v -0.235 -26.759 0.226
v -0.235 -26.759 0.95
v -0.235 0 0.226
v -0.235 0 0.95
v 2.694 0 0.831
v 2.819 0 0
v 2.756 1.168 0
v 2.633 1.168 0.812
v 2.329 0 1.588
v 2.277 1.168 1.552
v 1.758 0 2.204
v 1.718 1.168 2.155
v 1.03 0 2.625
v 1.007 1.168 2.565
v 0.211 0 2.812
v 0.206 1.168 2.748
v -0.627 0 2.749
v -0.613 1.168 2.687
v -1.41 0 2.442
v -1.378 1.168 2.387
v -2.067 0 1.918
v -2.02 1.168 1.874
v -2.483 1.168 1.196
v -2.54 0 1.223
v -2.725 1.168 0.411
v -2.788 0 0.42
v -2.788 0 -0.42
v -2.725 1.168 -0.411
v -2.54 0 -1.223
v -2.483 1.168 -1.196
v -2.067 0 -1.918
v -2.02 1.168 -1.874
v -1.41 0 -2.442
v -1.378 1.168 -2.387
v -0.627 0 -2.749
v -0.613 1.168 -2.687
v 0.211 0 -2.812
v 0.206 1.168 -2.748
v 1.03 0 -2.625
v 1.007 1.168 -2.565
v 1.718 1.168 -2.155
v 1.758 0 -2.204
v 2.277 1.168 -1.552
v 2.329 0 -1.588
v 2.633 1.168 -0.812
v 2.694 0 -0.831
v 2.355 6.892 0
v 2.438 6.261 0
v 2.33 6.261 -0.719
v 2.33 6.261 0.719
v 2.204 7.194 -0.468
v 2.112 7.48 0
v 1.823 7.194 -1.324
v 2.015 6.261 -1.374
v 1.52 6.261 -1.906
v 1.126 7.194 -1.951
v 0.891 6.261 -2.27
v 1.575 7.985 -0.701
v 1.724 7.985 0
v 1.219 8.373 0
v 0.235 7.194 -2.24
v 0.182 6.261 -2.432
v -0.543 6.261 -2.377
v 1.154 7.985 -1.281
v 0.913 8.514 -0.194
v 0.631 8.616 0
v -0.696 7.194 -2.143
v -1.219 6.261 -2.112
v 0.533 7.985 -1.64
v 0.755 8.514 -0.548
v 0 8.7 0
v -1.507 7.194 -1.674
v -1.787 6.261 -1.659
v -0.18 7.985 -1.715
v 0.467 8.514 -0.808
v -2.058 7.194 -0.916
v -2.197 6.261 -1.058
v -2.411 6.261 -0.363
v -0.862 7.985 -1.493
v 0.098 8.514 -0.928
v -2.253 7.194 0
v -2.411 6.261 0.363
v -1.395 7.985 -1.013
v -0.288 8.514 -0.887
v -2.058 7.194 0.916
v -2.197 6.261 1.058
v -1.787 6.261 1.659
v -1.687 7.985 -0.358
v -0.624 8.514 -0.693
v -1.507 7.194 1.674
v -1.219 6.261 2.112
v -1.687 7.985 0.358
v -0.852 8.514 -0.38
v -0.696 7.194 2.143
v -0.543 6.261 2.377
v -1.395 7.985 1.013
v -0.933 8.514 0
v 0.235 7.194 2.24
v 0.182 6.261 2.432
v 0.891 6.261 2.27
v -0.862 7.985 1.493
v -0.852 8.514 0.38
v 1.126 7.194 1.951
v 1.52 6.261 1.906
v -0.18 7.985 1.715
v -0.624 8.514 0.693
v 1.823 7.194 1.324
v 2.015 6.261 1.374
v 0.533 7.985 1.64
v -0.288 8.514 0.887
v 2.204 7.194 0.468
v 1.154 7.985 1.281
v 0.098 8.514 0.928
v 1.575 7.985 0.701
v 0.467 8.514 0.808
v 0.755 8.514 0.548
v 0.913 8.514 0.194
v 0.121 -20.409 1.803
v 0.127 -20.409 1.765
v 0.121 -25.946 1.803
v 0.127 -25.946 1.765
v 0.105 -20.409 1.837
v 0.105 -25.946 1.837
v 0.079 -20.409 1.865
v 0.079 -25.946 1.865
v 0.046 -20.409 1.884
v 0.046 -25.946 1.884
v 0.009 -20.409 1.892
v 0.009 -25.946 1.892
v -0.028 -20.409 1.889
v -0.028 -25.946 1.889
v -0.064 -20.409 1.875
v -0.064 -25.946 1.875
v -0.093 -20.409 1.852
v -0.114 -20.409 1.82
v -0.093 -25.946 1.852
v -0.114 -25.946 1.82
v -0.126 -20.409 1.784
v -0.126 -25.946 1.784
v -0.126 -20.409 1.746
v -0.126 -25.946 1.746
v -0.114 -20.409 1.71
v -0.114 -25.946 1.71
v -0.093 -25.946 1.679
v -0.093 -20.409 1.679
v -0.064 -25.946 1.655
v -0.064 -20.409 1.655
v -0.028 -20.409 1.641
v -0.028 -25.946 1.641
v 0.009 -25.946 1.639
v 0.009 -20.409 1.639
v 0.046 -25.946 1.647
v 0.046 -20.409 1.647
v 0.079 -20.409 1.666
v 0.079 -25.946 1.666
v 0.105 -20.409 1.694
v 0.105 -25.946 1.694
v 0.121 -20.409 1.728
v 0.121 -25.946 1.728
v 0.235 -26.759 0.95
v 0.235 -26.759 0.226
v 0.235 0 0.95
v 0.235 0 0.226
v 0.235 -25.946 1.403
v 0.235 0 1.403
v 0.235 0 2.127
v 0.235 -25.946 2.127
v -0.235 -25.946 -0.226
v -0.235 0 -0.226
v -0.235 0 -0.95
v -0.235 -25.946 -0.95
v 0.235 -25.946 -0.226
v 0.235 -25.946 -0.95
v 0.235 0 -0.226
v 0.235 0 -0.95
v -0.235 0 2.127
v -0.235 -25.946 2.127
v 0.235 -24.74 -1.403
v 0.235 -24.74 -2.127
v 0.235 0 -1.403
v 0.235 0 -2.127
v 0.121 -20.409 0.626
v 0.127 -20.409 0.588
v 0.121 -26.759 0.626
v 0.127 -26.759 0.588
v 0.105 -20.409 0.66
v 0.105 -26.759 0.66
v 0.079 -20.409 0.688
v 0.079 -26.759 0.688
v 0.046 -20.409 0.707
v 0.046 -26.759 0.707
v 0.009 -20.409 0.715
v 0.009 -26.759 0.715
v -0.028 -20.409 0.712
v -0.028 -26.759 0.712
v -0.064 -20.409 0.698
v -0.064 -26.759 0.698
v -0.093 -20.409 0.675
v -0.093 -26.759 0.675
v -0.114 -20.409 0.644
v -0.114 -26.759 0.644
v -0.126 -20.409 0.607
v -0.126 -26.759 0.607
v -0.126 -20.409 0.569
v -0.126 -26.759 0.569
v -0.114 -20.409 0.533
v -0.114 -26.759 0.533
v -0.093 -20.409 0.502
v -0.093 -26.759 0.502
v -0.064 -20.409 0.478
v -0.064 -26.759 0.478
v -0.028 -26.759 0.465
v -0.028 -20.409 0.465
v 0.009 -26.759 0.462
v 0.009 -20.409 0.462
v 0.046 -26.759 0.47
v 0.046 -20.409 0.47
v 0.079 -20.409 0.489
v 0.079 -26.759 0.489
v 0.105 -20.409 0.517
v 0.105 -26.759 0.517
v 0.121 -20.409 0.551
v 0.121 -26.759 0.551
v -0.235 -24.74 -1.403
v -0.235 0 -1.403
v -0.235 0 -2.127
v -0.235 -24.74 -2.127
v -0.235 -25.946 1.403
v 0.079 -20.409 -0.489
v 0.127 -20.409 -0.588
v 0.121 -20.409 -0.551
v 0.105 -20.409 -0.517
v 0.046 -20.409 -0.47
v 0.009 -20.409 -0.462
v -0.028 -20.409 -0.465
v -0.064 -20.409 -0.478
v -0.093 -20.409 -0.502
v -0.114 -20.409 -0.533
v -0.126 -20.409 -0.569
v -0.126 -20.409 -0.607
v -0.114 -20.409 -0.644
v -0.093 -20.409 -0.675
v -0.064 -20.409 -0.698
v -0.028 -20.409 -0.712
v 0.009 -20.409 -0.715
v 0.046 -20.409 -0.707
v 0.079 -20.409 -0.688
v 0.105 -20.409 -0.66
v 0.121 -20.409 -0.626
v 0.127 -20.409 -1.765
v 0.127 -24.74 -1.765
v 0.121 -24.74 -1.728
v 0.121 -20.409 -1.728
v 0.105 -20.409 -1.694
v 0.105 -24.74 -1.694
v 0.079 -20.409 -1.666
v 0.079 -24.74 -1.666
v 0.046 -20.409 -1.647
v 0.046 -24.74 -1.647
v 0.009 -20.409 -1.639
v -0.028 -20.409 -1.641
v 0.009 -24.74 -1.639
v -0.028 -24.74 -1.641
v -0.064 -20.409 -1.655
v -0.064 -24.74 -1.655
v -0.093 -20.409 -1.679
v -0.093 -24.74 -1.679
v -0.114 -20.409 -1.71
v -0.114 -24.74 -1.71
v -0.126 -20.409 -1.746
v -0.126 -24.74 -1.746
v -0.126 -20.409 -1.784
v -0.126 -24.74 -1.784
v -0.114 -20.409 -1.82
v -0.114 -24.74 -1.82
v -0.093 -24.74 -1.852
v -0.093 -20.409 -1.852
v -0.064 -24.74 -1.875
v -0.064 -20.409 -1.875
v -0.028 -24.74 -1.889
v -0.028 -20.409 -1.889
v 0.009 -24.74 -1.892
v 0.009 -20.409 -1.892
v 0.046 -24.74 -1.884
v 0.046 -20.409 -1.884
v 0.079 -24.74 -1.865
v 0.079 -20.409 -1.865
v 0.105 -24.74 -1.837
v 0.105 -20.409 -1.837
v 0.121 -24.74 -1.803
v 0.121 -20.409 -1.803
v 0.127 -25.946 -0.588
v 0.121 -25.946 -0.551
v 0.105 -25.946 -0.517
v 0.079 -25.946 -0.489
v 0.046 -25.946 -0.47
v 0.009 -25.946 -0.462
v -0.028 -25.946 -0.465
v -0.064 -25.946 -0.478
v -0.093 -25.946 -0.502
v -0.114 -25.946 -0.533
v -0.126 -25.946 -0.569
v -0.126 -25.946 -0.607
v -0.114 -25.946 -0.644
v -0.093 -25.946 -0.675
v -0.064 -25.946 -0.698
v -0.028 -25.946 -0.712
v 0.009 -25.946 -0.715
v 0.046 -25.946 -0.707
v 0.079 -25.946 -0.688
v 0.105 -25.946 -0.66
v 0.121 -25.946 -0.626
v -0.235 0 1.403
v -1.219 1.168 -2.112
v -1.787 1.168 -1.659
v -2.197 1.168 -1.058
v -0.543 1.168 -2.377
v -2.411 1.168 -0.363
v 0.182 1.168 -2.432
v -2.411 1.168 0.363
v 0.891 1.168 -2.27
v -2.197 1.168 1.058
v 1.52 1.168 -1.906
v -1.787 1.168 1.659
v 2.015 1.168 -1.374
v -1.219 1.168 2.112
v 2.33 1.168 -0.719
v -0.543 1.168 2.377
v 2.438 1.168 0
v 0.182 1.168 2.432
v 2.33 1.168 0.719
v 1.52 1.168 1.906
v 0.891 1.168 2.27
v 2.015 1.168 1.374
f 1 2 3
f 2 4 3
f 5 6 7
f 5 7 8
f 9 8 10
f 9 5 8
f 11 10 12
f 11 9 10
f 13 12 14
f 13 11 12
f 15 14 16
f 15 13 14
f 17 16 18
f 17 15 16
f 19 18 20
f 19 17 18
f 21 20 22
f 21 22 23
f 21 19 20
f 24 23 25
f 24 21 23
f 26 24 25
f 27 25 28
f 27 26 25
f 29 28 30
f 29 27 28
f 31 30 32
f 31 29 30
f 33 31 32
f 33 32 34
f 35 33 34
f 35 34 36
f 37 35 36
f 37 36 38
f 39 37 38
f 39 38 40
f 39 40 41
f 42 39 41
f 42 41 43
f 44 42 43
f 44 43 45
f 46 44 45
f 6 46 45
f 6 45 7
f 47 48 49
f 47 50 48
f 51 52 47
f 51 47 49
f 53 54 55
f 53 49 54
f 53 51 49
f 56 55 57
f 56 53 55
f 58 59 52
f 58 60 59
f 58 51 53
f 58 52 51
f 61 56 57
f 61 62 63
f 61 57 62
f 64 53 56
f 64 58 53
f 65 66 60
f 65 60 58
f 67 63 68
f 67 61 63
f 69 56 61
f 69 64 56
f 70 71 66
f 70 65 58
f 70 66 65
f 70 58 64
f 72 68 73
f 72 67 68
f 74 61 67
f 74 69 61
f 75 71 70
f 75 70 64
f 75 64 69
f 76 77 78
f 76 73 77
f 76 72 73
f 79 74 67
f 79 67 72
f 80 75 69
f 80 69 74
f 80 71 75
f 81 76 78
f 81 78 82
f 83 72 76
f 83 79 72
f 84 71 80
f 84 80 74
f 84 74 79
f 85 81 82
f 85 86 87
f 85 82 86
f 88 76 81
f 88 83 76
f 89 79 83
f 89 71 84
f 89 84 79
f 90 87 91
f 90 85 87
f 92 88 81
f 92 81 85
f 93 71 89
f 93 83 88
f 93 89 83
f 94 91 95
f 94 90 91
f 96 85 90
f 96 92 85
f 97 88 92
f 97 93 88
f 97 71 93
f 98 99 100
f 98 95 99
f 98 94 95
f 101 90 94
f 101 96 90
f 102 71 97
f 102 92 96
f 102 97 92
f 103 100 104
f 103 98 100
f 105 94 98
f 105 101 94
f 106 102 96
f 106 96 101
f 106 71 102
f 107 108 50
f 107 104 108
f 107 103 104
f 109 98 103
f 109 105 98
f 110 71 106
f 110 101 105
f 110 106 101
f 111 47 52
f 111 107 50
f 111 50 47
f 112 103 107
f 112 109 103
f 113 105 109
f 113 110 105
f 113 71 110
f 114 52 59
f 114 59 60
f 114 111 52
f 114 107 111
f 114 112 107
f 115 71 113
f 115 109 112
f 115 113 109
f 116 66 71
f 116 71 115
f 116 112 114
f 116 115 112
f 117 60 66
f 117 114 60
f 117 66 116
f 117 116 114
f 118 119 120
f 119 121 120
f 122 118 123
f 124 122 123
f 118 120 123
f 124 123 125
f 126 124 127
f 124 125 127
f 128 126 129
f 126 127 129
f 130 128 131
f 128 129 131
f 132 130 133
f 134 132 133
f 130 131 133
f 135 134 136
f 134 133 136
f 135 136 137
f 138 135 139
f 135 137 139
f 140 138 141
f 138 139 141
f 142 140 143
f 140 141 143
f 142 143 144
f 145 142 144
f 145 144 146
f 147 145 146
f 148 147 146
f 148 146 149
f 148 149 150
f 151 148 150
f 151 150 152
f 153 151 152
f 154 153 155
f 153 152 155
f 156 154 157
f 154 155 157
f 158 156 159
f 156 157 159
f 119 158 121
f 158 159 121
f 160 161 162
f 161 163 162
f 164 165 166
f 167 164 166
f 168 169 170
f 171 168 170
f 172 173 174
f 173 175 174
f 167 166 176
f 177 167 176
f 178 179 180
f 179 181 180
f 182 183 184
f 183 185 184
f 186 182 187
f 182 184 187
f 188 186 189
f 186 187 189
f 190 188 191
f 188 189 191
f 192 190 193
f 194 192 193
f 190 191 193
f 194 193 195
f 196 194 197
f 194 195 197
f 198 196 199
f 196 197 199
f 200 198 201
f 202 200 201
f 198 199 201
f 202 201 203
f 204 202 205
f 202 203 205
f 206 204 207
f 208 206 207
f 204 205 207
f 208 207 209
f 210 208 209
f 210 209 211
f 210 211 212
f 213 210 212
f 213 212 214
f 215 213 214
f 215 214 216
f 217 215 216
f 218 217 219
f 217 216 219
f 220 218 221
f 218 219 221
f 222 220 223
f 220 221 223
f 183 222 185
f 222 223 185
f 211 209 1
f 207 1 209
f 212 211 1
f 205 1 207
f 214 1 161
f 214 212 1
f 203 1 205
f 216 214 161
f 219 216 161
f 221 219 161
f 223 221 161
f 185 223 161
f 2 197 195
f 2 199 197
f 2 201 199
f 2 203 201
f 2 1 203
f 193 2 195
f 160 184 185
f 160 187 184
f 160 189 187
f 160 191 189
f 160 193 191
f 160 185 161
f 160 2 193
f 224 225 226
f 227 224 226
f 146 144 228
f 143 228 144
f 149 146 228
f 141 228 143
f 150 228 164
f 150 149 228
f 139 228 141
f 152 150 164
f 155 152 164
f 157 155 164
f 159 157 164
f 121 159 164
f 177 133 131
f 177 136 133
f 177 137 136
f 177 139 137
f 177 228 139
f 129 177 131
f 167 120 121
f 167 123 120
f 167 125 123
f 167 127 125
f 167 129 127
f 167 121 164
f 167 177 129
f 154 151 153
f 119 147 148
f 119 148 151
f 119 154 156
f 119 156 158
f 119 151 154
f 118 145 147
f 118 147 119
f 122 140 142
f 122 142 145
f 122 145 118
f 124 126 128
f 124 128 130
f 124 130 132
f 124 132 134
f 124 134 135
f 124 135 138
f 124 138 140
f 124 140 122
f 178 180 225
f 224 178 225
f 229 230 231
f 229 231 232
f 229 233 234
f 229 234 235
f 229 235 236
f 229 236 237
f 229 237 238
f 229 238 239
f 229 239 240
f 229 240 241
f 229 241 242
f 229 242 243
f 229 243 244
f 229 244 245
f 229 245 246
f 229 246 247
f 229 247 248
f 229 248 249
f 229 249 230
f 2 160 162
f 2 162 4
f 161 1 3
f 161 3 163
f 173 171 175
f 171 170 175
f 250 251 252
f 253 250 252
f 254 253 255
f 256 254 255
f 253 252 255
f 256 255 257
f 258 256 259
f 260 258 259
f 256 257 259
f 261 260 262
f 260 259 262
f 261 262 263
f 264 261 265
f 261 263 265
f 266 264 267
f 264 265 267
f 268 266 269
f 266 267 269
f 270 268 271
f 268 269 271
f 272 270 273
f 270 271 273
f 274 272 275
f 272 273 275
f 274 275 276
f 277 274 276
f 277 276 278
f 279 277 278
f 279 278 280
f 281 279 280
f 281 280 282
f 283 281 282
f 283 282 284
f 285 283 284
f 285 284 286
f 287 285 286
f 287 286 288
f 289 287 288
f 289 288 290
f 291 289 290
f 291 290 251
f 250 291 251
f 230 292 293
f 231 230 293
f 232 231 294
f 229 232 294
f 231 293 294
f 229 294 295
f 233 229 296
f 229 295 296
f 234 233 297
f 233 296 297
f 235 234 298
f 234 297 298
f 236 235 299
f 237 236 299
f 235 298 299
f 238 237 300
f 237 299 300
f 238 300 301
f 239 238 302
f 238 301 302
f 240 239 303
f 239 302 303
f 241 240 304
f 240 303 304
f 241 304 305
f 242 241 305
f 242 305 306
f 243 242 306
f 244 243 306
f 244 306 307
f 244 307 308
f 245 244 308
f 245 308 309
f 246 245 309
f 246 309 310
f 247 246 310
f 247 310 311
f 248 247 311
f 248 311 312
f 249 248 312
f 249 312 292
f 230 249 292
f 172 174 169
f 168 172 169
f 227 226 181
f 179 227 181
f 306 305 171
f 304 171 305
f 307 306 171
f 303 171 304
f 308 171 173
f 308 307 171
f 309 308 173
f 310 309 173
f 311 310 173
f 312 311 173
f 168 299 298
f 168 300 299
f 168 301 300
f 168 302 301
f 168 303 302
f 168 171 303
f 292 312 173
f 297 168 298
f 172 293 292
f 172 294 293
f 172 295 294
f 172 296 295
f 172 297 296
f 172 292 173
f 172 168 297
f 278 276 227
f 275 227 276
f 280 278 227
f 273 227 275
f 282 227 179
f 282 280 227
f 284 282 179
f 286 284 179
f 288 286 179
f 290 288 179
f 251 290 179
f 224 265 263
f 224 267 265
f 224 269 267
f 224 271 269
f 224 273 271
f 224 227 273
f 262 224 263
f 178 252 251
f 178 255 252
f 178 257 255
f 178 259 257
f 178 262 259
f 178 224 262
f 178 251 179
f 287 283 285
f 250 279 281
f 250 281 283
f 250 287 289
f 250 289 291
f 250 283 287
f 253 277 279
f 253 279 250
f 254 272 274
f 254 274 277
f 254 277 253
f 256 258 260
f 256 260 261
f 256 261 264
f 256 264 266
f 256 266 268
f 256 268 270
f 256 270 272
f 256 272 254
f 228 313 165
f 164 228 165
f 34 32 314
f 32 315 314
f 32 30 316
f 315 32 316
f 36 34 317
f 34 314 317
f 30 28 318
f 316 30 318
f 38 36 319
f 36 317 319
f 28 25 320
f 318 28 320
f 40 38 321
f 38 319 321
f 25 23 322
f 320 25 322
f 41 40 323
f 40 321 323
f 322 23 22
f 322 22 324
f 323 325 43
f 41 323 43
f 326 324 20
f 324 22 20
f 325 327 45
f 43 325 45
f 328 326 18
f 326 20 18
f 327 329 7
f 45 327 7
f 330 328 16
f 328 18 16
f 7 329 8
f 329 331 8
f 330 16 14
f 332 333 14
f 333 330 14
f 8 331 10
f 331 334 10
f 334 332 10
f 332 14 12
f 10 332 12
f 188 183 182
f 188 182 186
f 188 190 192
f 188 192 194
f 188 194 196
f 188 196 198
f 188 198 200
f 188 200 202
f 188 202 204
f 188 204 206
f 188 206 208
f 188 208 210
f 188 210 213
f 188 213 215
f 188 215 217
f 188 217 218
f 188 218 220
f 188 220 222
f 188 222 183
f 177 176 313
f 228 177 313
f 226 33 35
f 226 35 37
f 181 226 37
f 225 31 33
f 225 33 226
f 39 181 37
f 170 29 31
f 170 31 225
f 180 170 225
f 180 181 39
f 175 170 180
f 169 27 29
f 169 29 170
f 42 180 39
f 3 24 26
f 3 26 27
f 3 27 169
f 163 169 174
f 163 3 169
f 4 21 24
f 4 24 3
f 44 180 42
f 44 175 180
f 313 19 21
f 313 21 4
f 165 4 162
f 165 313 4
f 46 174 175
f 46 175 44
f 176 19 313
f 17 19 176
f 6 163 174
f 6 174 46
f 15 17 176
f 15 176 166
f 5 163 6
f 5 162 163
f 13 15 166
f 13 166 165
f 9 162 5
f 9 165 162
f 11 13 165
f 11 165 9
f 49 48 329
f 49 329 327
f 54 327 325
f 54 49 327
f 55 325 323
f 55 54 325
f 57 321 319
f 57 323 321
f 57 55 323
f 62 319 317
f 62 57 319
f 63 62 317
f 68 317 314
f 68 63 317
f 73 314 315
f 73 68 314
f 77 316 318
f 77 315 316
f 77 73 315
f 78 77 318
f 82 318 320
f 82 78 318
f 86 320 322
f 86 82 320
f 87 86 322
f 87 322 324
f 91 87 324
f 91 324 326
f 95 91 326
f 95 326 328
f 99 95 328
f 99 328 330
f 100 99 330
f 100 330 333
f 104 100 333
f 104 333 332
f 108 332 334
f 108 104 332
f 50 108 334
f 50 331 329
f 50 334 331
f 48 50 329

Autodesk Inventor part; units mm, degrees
ref_plane "YZ Plane" through (0, 0, 0) normal (1, 0, 0) x (0, 1, 0)
ref_plane "XZ Plane" through (0, 0, 0) normal (0, 1, 0) x (-1, 0, 0)
ref_plane "XY Plane" through (0, 0, 0) normal (0, 0, 1) x (1, 0, 0)
sketch "Sketch1" plane through (0, 0, 0) normal (0, 0, 1) x (1, 0, 0)
  line L0 (0, 8.6995) -> (0, 0)
  line L1 (0, 0) -> (2.8194, 0)
  line L2 (2.8194, 0) -> (2.7559, 1.1684)
  line L3 (2.7559, 1.1684) -> (2.4384, 1.1684)
  line L4 (2.4384, 1.1684) -> (2.4384, 6.2611)
  arc A0 (2.4384, 6.2611) -> (0, 8.6995) centre (0, 6.2611) ccw
  dimension "d0" = 2.4384
  dimension "d1" = 2.8194
  dimension "d2" = 2.7559
  dimension "d3" = 1.1684
  dimension "d4" = 8.6995
revolve "Revolution1" add sketch "Sketch1" angle 360 about axis through (0, 8.6995, 0) along (0, -1, 0)
sketch "Sketch2" plane through (0, 0, 0) normal (0, -1, 0) x (1, 0, 0)
  line L0 (0.235, 2.1273) -> (-0.2349, 2.1273)
  line L1 (-0.2349, 2.1273) -> (-0.2349, 1.4034)
  line L2 (-0.2349, 1.4034) -> (0.235, 1.4034)
  line L3 (0.235, 1.4034) -> (0.235, 2.1273)
  line L4 (0.235, 2.1273) -> (-0.2349, 1.4034) construction
  line L5 (-0.2349, 2.1273) -> (0.235, 1.4034) construction
  line L6 (0.235, 0.9504) -> (-0.2349, 0.9504)
  line L7 (-0.2349, 0.9504) -> (-0.2349, 0.2265)
  line L8 (-0.2349, 0.2265) -> (0.235, 0.2265)
  line L9 (0.235, 0.2265) -> (0.235, 0.9504)
  line L10 (0.235, 0.9504) -> (-0.2349, 0.2265) construction
  line L11 (-0.2349, 0.9504) -> (0.235, 0.2265) construction
  line L12 (0.235, -0.2265) -> (-0.2349, -0.2265)
  line L13 (-0.2349, -0.2265) -> (-0.2349, -0.9504)
  line L14 (-0.2349, -0.9504) -> (0.235, -0.9504)
  line L15 (0.235, -0.9504) -> (0.235, -0.2265)
  line L16 (0.235, -0.2265) -> (-0.2349, -0.9504) construction
  line L17 (-0.2349, -0.2265) -> (0.235, -0.9504) construction
  line L18 (0.2349, -1.4033) -> (-0.2349, -1.4033)
  line L19 (-0.2349, -1.4033) -> (-0.2349, -2.1273)
  line L20 (-0.2349, -2.1273) -> (0.2349, -2.1273)
  line L21 (0.2349, -2.1273) -> (0.2349, -1.4033)
  line L22 (0.2349, -1.4033) -> (-0.2349, -2.1273) construction
  line L23 (-0.2349, -1.4033) -> (0.2349, -2.1273) construction
  circle A0 centre (0, 0) radius 2.7559 construction
  line L24 (2.7559, 0) -> (-2.7559, 0) construction
  point P0 (0, 0)
  point P1 (0, 1.7653)
  point P2 (0, 0.5884)
  point P3 (0, -0.5884)
  point P4 (0, -1.7653)
  point P5 (0, -1.7653)
  point P6 (0, -0.9504)
  point P7 (0, -0.5884)
  point P8 (0, 0.5884)
  point P9 (0, 0.2265)
  point P10 (0, 1.7653)
  point P11 (0, -0.5884)
  dimension "d6" = 0.4699
  dimension "d7" = 0.7239
  dimension "d8" = 4.2545
  dimension "d9" = 0.453
  dimension "d10" = 0.453
extrude "Extrusion1" add sketch "Sketch2" along normal blind 24.7396
sketch "Sketch3" plane through (0, -24.7396, 0) normal (0, -1, 0) x (1, 0, 0)
  line L0 (0.235, 2.1273) -> (-0.2349, 2.1273) projected
  line L1 (-0.2349, 2.1273) -> (-0.2349, 1.4034) projected
  line L2 (-0.2349, 1.4034) -> (0.235, 1.4034) projected
  line L3 (0.235, 1.4034) -> (0.235, 2.1273) projected
  line L4 (0.235, -0.2265) -> (-0.2349, -0.2265) projected
  line L5 (-0.2349, -0.2265) -> (-0.2349, -0.9504) projected
  line L6 (-0.2349, -0.9504) -> (0.235, -0.9504) projected
  line L7 (0.235, -0.9504) -> (0.235, -0.2265) projected
  point P0 (0, 0)
extrude "Extrusion2" add sketch "Sketch3" along normal blind 1.2065
sketch "Sketch4" plane through (0, -24.7396, 0) normal (0, -1, 0) x (1, 0, 0)
  line L0 (0.235, 0.9504) -> (-0.2349, 0.9504) projected
  line L1 (-0.2349, 0.9504) -> (-0.2349, 0.2265) projected
  line L2 (-0.2349, 0.2265) -> (0.235, 0.2265) projected
  line L3 (0.235, 0.2265) -> (0.235, 0.9504) projected
  point P0 (0, 0)
extrude "Extrusion3" add sketch "Sketch4" along normal blind 2.0193
sketch "Sketch5" plane through (0, -26.7589, 0) normal (0, -1, 0) x (1, 0, 0)
  line L0 (0.235, -0.2265) -> (0.235, -0.9504) projected
  line L1 (0.235, -0.9504) -> (-0.2349, -0.9504) projected
  line L2 (-0.2349, -0.9504) -> (-0.2349, -0.2265) projected
  line L3 (-0.2349, -0.2265) -> (0.235, -0.2265) projected
  line L4 (0.235, 2.1273) -> (0.235, 1.4034) projected
  line L5 (0.235, 1.4034) -> (-0.2349, 1.4034) projected
  line L6 (-0.2349, 1.4034) -> (-0.2349, 2.1273) projected
  line L7 (-0.2349, 2.1273) -> (0.235, 2.1273) projected
  line L8 (0.235, 0.9504) -> (0.235, 0.2265) projected
  line L9 (0.235, 0.2265) -> (-0.2349, 0.2265) projected
  line L10 (-0.2349, 0.2265) -> (-0.2349, 0.9504) projected
  line L11 (-0.2349, 0.9504) -> (0.235, 0.9504) projected
  line L12 (0.2349, -1.4033) -> (0.2349, -2.1273) projected
  line L13 (0.2349, -2.1273) -> (-0.2349, -2.1273) projected
  line L14 (-0.2349, -2.1273) -> (-0.2349, -1.4033) projected
  line L15 (-0.2349, -1.4033) -> (0.2349, -1.4033) projected
  circle A0 centre (0, 0) radius 2.8194 projected
  circle A1 centre (0, 1.7653) radius 0.127
  circle A2 centre (0, 0.5884) radius 0.127
  circle A3 centre (0, -0.5884) radius 0.127
  circle A4 centre (0, -1.7653) radius 0.127
  point P0 (0.235, 1.7653)
  point P1 (0.235, 0.5884)
  point P2 (0.235, -0.5884)
  point P3 (0.2349, -1.7653)
  point P4 (0, 1.4034)
  dimension "d17" = 0.254
extrude "Extrusion4" cut sketch "Sketch5" against normal blind 6.35 contours A1 | A2 | A3 | A4
equation "\"d9\" = d10"
properties part number "Clipped LED"
